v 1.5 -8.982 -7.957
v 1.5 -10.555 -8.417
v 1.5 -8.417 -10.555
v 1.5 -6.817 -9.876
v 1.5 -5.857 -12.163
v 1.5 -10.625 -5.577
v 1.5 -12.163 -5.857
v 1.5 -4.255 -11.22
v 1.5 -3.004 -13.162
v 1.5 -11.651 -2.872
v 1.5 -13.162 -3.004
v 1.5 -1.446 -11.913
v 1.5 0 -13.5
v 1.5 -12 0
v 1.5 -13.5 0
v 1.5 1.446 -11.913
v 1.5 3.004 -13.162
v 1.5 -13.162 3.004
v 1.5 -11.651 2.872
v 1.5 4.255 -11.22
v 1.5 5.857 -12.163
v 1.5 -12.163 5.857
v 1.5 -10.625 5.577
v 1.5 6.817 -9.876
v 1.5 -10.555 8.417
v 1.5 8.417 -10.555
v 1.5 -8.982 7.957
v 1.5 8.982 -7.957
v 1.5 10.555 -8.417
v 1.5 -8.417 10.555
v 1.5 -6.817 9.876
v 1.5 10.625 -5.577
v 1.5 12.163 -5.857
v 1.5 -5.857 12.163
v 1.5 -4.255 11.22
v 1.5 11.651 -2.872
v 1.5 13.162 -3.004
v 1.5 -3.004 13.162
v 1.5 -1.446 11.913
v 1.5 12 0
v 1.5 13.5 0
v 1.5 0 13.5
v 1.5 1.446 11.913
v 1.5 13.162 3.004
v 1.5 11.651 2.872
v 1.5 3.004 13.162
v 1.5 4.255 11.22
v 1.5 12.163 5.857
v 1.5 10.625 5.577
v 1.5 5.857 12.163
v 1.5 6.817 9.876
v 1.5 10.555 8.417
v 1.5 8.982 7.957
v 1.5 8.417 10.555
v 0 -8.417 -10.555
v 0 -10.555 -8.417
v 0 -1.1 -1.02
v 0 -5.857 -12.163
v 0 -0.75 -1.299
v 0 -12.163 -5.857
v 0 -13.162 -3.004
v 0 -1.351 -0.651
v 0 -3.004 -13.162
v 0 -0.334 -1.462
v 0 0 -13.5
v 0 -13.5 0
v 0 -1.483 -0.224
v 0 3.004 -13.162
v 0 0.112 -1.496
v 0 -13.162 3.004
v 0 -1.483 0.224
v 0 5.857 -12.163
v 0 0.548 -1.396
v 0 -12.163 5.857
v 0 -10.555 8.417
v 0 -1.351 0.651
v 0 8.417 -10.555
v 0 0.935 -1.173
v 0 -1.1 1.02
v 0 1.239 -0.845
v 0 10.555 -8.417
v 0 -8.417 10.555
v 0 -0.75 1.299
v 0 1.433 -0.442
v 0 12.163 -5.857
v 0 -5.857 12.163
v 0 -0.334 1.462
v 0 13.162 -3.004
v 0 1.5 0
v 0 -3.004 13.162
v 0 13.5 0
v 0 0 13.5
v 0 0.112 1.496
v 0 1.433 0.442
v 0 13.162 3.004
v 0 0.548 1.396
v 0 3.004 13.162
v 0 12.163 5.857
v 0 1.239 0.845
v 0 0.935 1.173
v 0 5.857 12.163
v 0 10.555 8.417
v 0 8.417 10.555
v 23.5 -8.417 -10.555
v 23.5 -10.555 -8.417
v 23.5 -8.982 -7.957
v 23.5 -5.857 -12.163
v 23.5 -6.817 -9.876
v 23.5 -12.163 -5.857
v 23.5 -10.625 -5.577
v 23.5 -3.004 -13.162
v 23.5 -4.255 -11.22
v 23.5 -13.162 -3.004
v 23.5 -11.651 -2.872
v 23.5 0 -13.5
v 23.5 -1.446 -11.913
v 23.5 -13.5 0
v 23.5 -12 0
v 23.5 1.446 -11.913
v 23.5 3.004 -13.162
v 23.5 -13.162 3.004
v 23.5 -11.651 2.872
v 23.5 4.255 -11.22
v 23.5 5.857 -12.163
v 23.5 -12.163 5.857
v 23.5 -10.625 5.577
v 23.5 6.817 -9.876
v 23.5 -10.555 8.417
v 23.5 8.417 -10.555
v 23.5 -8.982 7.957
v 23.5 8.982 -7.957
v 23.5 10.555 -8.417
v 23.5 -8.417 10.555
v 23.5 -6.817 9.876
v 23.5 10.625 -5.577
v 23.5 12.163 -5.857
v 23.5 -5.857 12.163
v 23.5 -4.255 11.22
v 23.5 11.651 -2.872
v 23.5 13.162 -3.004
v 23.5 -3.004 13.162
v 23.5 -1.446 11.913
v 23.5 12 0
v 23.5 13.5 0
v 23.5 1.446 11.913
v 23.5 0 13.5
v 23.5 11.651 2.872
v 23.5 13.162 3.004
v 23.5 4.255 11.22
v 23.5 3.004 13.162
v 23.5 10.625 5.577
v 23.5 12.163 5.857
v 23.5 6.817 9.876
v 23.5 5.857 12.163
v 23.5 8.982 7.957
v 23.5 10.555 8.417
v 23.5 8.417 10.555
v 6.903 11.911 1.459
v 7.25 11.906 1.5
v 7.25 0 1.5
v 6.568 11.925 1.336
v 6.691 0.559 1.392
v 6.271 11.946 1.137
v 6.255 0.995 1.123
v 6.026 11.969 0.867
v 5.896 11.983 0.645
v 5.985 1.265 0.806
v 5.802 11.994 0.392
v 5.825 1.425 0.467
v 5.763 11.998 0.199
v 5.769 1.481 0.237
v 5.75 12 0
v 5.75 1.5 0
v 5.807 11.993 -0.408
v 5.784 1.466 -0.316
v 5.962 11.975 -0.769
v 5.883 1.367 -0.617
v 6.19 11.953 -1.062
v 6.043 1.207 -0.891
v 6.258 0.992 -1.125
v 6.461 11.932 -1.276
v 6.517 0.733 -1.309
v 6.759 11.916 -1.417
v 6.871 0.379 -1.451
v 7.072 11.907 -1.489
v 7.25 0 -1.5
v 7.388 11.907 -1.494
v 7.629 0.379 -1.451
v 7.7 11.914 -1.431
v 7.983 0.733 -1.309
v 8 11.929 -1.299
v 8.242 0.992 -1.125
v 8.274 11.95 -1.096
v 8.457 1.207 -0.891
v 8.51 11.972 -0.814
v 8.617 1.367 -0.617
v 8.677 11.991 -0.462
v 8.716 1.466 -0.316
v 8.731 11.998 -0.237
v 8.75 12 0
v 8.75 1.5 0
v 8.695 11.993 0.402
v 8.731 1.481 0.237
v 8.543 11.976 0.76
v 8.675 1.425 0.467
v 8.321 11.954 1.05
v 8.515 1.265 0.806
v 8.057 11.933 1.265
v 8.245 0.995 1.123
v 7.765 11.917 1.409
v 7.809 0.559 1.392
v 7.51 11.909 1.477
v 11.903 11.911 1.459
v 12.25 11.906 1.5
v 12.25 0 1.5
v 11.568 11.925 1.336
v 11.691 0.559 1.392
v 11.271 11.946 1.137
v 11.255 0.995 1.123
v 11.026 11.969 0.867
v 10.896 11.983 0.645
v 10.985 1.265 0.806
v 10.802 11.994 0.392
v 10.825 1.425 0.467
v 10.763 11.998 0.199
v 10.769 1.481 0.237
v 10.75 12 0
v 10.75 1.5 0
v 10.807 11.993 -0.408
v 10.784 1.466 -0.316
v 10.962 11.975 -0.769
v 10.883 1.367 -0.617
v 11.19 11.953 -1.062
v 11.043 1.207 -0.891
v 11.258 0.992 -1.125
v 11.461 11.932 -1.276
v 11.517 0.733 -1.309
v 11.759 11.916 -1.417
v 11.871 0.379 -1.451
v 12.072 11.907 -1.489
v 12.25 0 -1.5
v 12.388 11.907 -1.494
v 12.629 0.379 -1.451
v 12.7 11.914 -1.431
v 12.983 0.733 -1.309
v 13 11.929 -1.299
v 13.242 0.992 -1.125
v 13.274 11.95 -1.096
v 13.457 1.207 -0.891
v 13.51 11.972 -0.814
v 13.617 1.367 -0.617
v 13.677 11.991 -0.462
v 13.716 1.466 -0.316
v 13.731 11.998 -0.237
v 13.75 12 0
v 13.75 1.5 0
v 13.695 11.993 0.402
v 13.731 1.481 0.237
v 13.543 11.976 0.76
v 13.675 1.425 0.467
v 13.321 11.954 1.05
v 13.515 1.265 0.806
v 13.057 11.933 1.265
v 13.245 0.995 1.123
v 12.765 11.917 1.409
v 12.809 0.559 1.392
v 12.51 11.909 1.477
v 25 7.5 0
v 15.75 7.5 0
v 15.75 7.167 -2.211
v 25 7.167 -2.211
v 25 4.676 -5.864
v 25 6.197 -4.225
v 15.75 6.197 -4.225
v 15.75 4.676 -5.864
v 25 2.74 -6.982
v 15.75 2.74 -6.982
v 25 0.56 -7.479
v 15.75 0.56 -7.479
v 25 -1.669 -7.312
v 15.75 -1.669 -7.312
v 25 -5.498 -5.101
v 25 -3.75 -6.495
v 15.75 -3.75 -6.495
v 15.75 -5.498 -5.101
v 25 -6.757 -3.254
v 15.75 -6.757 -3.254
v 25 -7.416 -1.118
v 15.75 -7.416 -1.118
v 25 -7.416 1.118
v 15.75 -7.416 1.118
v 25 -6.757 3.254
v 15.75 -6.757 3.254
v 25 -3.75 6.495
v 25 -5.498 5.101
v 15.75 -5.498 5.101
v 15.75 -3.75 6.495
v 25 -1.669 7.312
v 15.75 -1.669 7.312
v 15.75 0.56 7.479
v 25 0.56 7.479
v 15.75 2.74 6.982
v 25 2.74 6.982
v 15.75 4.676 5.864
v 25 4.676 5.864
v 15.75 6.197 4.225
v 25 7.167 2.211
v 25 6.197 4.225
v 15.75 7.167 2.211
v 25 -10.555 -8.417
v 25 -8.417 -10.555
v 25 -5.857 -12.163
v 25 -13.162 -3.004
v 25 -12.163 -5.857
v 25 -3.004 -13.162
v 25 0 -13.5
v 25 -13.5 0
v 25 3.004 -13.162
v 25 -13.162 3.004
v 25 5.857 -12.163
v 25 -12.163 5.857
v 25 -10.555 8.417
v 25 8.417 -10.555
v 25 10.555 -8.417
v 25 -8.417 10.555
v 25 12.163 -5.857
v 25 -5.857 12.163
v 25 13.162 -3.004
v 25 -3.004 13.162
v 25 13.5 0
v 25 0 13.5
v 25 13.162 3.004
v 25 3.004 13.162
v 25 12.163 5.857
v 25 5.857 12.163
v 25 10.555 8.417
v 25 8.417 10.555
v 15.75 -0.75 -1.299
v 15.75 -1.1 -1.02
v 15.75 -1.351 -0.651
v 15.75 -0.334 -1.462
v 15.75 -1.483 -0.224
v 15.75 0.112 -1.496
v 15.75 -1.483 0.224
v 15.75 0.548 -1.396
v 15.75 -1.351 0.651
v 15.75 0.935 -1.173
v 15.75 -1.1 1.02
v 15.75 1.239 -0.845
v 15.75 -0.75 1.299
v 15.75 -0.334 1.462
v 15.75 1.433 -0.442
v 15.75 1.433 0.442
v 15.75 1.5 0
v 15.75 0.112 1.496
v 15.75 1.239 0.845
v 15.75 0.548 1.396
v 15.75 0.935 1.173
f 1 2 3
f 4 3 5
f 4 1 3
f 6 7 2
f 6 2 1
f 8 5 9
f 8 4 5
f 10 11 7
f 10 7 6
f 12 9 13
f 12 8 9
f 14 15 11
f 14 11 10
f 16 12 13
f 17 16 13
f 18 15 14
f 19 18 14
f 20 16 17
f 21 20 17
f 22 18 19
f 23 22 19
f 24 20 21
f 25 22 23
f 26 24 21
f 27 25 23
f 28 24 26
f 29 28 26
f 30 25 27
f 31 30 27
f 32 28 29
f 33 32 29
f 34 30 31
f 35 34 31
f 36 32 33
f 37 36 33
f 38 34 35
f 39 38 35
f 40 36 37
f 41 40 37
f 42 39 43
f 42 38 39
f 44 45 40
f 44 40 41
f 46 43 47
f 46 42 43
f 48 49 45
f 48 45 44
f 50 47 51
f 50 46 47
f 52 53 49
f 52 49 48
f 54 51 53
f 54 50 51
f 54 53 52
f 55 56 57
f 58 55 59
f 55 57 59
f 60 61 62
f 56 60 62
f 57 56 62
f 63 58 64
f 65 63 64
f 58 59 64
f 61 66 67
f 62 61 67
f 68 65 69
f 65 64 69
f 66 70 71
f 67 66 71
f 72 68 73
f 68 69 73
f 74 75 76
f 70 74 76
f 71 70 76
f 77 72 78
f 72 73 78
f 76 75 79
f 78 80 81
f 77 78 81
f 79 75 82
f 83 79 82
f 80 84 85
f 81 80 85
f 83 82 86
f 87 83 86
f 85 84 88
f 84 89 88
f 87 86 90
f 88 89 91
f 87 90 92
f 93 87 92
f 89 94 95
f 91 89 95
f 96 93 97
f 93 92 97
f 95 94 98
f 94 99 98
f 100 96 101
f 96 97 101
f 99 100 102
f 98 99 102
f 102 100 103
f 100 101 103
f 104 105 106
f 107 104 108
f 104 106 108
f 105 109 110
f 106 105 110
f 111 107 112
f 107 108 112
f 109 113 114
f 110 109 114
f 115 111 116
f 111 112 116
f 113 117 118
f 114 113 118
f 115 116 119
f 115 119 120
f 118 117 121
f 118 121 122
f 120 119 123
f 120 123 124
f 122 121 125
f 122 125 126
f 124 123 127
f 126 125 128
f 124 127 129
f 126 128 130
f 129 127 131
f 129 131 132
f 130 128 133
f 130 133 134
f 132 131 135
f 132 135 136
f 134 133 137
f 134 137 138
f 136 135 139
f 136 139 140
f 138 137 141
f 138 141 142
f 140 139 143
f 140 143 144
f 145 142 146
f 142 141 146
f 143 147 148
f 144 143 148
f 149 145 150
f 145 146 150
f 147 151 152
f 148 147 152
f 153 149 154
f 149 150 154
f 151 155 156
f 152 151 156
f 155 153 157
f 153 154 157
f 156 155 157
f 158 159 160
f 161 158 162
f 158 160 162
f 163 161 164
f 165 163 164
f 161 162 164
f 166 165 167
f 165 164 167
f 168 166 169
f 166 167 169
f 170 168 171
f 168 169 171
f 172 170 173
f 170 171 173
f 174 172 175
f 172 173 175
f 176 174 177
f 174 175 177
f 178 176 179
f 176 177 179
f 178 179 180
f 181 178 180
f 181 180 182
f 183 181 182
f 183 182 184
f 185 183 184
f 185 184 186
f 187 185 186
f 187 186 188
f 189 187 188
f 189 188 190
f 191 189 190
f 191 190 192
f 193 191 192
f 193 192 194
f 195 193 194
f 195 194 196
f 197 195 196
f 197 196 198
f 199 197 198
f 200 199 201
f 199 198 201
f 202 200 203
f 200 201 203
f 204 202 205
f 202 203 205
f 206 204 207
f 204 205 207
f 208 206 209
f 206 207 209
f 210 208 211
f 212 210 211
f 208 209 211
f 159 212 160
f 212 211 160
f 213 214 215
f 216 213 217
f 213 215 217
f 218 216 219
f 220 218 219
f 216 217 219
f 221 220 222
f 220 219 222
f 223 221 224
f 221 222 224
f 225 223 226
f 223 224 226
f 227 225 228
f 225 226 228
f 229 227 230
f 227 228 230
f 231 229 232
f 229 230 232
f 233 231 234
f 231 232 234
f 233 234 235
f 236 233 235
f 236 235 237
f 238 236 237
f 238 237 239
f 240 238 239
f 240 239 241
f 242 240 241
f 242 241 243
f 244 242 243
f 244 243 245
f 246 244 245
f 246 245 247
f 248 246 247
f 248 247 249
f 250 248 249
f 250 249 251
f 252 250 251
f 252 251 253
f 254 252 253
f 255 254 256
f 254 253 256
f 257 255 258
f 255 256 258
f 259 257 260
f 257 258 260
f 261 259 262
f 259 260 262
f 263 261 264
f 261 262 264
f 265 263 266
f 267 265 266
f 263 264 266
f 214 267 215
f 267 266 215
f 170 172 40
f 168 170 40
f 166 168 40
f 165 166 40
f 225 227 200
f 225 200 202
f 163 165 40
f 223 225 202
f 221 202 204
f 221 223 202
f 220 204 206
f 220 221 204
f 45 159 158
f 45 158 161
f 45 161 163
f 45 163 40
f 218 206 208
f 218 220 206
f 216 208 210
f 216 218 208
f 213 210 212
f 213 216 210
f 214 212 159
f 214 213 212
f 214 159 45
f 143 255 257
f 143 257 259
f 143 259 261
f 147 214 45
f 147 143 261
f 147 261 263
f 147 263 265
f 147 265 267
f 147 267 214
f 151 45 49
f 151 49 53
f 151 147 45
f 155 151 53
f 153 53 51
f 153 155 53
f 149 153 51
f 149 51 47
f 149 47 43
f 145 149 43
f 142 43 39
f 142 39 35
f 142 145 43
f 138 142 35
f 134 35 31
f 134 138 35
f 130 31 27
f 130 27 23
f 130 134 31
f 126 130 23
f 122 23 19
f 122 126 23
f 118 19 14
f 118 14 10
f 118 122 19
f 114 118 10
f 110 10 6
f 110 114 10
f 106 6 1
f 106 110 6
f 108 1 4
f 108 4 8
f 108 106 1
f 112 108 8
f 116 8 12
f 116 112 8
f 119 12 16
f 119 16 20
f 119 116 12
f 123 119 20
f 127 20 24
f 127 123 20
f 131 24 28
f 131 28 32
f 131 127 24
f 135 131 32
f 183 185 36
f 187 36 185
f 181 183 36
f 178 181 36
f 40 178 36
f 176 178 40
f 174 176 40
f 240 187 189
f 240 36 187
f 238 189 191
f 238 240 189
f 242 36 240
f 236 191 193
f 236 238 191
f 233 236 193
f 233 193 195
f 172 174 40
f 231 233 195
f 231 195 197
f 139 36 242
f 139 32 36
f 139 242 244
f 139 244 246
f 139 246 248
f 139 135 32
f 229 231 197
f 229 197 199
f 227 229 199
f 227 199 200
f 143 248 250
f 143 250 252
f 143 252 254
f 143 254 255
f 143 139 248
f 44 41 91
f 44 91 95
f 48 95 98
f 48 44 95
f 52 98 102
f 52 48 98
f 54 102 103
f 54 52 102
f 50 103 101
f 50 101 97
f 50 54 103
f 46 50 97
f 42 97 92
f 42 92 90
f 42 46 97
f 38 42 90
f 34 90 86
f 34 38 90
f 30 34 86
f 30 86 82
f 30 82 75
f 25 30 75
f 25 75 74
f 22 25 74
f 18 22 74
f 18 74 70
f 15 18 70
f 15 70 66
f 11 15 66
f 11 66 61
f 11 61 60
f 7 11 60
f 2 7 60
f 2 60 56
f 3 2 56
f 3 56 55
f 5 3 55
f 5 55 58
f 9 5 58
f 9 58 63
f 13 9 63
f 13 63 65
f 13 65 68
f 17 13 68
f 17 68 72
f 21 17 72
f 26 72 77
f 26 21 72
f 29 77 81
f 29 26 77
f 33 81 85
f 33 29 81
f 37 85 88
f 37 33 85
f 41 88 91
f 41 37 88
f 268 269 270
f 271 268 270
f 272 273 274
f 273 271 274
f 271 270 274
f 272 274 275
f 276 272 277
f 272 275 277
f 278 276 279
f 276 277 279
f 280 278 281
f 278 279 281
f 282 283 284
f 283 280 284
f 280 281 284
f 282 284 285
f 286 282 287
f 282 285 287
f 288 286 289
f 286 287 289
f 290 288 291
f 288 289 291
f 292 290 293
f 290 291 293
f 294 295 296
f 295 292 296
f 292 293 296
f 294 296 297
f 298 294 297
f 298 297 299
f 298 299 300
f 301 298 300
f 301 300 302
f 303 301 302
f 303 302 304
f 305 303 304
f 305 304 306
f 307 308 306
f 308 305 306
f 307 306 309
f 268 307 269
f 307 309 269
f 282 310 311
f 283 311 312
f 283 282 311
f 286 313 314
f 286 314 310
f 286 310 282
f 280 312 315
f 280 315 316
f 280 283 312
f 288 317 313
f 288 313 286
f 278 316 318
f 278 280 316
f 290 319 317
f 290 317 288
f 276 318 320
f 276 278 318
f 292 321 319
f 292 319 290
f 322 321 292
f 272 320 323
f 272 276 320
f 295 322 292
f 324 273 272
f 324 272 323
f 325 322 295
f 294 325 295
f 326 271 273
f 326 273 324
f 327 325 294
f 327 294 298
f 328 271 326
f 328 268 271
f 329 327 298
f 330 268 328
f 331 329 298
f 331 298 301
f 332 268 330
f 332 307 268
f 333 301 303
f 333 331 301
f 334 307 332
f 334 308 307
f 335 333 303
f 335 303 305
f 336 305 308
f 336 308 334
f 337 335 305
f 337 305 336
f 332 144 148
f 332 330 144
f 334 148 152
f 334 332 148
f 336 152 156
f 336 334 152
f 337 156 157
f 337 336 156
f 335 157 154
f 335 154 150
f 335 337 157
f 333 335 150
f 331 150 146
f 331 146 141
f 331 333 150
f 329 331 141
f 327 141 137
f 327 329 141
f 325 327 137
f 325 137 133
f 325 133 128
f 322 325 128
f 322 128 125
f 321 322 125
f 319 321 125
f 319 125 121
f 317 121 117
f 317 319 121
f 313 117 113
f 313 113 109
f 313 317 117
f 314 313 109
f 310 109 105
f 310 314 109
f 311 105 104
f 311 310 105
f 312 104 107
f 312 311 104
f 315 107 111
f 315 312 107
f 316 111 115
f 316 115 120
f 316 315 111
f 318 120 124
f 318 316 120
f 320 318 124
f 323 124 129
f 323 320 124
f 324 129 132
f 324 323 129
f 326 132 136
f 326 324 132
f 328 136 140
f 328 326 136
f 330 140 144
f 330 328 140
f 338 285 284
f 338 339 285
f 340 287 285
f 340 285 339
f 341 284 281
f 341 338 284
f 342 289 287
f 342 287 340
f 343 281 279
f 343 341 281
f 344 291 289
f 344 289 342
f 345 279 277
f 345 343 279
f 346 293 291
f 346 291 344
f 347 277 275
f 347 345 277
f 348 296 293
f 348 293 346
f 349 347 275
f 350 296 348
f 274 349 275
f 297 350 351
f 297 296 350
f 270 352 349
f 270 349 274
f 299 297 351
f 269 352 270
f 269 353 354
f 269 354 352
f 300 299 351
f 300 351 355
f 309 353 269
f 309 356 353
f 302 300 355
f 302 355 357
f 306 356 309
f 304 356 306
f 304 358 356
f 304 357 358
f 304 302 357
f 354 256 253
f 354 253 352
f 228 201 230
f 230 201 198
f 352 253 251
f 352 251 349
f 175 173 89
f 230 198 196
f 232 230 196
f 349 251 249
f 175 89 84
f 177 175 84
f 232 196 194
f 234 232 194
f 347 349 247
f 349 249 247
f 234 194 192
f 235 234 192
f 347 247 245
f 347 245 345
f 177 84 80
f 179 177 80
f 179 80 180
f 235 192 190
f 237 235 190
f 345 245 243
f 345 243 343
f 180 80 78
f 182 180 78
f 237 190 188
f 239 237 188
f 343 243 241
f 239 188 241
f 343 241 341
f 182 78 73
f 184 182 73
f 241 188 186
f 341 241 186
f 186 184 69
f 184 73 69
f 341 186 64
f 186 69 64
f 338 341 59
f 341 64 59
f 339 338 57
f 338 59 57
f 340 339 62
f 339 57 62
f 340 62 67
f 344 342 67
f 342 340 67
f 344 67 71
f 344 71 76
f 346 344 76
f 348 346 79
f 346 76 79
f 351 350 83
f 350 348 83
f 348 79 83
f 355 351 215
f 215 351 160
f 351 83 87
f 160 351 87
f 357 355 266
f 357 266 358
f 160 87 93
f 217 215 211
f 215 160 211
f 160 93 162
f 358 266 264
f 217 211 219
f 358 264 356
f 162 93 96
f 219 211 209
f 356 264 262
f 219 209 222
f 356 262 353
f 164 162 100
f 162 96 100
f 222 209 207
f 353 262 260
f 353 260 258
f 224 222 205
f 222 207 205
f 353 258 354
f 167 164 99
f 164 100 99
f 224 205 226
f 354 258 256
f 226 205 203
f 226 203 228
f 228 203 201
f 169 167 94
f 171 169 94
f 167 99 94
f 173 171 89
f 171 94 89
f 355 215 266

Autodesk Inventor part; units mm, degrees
ref_plane "YZ Plane" through (0, 0, 0) normal (1, 0, 0) x (0, 1, 0)
ref_plane "XY Plane" through (0, 0, 0) normal (0, 0, 1) x (1, 0, 0)
sketch "Náčrt1" plane through (0, 0, 0) normal (0, 0, 1) x (1, 0, 0)
  line L0 (0, 0) -> (25, 0)
  line L1 (0, 0) -> (0, 13.5)
  line L2 (0, 13.5) -> (1.5, 13.5)
  line L3 (1.5, 13.5) -> (1.5, 12)
  line L4 (1.5, 12) -> (23.5, 12)
  line L5 (23.5, 12) -> (23.5, 13.5)
  line L6 (23.5, 13.5) -> (25, 13.5)
  line L7 (25, 13.5) -> (25, 7.5)
  line L8 (25, 7.5) -> (15.75, 7.5)
  line L9 (48.5, 7.4) -> (48.5, -7.4) construction
  line L10 (6.5, 1.5) -> (6.5, -1.5) construction
  line L11 (15.75, 7.4) -> (15.75, -7.4) construction
  line L12 (6.5, 1.5) -> (15.75, 1.5) construction
  line L13 (6.5, -1.5) -> (15.75, -1.5) construction
  line L14 (15.75, 7.5) -> (15.75, 0)
  line L15 (13.75, 12) -> (13.75, 1.5) construction
  line L16 (10.75, 1.5) -> (10.75, 12) construction
  line L17 (8.75, 12) -> (8.75, 1.5) construction
  line L18 (5.75, 1.5) -> (5.75, 12) construction
  line L19 (15.75, 1.5) -> (0, 1.5)
  line L20 (5.75, 12) -> (7.25, 12) construction
  line L21 (7.25, 12) -> (8.75, 12) construction
  line L22 (12.25, 12) -> (10.75, 12) construction
  line L23 (12.25, 12) -> (13.75, 12) construction
  point P0 (6.5, 0)
  point P1 (24.25, 13.5)
  point P2 (15.75, 1.5)
  dimension "d1" = 15
  dimension "d2" = 48.5
  dimension "d3" = 42
  dimension "d4" = 3
  dimension "d5" = 9.25
  dimension "d6" = 14.8
  dimension "d7" = 27
  dimension "d8" = 25
  dimension "d9" = 1.5
  dimension "d10" = 1.5
  dimension "d11" = 3
  dimension "d12" = 2
  dimension "d13" = 3
  dimension "d14" = 2
revolve "Rotace1" add sketch "Náčrt1" angle 360 about axis through (0, 0, 0) along (1, 0, 0) contours L1 L2 L3 L4 L5 L6 L7 L8 L14 L19
ref_plane "Pracovní rovina1" through (12.5, 12, 0) normal (0, 1, 0) x (-1, 0, 0)
sketch "Náčrt2" plane through (12.5, 12, 0) normal (0, 1, 0) x (-1, 0, 0)
  point P0 (12.5, 0)
  point P1 (5.25, 0)
  point P2 (0.25, 0)
hole "Díra1" at (7.25, 12, 0) at (12.25, 12, 0) direction (0, -1, 0) diameter 3 depth 12
thread "Závit1" size "M3x0.5" class "6H" standard "ANSI Metric M Profile" full length
thread "Závit2" size "M3x0.5" class "6H" standard "ANSI Metric M Profile" full length
properties part number "wheelGen2" material "Mosaz, měkká žlutá"
